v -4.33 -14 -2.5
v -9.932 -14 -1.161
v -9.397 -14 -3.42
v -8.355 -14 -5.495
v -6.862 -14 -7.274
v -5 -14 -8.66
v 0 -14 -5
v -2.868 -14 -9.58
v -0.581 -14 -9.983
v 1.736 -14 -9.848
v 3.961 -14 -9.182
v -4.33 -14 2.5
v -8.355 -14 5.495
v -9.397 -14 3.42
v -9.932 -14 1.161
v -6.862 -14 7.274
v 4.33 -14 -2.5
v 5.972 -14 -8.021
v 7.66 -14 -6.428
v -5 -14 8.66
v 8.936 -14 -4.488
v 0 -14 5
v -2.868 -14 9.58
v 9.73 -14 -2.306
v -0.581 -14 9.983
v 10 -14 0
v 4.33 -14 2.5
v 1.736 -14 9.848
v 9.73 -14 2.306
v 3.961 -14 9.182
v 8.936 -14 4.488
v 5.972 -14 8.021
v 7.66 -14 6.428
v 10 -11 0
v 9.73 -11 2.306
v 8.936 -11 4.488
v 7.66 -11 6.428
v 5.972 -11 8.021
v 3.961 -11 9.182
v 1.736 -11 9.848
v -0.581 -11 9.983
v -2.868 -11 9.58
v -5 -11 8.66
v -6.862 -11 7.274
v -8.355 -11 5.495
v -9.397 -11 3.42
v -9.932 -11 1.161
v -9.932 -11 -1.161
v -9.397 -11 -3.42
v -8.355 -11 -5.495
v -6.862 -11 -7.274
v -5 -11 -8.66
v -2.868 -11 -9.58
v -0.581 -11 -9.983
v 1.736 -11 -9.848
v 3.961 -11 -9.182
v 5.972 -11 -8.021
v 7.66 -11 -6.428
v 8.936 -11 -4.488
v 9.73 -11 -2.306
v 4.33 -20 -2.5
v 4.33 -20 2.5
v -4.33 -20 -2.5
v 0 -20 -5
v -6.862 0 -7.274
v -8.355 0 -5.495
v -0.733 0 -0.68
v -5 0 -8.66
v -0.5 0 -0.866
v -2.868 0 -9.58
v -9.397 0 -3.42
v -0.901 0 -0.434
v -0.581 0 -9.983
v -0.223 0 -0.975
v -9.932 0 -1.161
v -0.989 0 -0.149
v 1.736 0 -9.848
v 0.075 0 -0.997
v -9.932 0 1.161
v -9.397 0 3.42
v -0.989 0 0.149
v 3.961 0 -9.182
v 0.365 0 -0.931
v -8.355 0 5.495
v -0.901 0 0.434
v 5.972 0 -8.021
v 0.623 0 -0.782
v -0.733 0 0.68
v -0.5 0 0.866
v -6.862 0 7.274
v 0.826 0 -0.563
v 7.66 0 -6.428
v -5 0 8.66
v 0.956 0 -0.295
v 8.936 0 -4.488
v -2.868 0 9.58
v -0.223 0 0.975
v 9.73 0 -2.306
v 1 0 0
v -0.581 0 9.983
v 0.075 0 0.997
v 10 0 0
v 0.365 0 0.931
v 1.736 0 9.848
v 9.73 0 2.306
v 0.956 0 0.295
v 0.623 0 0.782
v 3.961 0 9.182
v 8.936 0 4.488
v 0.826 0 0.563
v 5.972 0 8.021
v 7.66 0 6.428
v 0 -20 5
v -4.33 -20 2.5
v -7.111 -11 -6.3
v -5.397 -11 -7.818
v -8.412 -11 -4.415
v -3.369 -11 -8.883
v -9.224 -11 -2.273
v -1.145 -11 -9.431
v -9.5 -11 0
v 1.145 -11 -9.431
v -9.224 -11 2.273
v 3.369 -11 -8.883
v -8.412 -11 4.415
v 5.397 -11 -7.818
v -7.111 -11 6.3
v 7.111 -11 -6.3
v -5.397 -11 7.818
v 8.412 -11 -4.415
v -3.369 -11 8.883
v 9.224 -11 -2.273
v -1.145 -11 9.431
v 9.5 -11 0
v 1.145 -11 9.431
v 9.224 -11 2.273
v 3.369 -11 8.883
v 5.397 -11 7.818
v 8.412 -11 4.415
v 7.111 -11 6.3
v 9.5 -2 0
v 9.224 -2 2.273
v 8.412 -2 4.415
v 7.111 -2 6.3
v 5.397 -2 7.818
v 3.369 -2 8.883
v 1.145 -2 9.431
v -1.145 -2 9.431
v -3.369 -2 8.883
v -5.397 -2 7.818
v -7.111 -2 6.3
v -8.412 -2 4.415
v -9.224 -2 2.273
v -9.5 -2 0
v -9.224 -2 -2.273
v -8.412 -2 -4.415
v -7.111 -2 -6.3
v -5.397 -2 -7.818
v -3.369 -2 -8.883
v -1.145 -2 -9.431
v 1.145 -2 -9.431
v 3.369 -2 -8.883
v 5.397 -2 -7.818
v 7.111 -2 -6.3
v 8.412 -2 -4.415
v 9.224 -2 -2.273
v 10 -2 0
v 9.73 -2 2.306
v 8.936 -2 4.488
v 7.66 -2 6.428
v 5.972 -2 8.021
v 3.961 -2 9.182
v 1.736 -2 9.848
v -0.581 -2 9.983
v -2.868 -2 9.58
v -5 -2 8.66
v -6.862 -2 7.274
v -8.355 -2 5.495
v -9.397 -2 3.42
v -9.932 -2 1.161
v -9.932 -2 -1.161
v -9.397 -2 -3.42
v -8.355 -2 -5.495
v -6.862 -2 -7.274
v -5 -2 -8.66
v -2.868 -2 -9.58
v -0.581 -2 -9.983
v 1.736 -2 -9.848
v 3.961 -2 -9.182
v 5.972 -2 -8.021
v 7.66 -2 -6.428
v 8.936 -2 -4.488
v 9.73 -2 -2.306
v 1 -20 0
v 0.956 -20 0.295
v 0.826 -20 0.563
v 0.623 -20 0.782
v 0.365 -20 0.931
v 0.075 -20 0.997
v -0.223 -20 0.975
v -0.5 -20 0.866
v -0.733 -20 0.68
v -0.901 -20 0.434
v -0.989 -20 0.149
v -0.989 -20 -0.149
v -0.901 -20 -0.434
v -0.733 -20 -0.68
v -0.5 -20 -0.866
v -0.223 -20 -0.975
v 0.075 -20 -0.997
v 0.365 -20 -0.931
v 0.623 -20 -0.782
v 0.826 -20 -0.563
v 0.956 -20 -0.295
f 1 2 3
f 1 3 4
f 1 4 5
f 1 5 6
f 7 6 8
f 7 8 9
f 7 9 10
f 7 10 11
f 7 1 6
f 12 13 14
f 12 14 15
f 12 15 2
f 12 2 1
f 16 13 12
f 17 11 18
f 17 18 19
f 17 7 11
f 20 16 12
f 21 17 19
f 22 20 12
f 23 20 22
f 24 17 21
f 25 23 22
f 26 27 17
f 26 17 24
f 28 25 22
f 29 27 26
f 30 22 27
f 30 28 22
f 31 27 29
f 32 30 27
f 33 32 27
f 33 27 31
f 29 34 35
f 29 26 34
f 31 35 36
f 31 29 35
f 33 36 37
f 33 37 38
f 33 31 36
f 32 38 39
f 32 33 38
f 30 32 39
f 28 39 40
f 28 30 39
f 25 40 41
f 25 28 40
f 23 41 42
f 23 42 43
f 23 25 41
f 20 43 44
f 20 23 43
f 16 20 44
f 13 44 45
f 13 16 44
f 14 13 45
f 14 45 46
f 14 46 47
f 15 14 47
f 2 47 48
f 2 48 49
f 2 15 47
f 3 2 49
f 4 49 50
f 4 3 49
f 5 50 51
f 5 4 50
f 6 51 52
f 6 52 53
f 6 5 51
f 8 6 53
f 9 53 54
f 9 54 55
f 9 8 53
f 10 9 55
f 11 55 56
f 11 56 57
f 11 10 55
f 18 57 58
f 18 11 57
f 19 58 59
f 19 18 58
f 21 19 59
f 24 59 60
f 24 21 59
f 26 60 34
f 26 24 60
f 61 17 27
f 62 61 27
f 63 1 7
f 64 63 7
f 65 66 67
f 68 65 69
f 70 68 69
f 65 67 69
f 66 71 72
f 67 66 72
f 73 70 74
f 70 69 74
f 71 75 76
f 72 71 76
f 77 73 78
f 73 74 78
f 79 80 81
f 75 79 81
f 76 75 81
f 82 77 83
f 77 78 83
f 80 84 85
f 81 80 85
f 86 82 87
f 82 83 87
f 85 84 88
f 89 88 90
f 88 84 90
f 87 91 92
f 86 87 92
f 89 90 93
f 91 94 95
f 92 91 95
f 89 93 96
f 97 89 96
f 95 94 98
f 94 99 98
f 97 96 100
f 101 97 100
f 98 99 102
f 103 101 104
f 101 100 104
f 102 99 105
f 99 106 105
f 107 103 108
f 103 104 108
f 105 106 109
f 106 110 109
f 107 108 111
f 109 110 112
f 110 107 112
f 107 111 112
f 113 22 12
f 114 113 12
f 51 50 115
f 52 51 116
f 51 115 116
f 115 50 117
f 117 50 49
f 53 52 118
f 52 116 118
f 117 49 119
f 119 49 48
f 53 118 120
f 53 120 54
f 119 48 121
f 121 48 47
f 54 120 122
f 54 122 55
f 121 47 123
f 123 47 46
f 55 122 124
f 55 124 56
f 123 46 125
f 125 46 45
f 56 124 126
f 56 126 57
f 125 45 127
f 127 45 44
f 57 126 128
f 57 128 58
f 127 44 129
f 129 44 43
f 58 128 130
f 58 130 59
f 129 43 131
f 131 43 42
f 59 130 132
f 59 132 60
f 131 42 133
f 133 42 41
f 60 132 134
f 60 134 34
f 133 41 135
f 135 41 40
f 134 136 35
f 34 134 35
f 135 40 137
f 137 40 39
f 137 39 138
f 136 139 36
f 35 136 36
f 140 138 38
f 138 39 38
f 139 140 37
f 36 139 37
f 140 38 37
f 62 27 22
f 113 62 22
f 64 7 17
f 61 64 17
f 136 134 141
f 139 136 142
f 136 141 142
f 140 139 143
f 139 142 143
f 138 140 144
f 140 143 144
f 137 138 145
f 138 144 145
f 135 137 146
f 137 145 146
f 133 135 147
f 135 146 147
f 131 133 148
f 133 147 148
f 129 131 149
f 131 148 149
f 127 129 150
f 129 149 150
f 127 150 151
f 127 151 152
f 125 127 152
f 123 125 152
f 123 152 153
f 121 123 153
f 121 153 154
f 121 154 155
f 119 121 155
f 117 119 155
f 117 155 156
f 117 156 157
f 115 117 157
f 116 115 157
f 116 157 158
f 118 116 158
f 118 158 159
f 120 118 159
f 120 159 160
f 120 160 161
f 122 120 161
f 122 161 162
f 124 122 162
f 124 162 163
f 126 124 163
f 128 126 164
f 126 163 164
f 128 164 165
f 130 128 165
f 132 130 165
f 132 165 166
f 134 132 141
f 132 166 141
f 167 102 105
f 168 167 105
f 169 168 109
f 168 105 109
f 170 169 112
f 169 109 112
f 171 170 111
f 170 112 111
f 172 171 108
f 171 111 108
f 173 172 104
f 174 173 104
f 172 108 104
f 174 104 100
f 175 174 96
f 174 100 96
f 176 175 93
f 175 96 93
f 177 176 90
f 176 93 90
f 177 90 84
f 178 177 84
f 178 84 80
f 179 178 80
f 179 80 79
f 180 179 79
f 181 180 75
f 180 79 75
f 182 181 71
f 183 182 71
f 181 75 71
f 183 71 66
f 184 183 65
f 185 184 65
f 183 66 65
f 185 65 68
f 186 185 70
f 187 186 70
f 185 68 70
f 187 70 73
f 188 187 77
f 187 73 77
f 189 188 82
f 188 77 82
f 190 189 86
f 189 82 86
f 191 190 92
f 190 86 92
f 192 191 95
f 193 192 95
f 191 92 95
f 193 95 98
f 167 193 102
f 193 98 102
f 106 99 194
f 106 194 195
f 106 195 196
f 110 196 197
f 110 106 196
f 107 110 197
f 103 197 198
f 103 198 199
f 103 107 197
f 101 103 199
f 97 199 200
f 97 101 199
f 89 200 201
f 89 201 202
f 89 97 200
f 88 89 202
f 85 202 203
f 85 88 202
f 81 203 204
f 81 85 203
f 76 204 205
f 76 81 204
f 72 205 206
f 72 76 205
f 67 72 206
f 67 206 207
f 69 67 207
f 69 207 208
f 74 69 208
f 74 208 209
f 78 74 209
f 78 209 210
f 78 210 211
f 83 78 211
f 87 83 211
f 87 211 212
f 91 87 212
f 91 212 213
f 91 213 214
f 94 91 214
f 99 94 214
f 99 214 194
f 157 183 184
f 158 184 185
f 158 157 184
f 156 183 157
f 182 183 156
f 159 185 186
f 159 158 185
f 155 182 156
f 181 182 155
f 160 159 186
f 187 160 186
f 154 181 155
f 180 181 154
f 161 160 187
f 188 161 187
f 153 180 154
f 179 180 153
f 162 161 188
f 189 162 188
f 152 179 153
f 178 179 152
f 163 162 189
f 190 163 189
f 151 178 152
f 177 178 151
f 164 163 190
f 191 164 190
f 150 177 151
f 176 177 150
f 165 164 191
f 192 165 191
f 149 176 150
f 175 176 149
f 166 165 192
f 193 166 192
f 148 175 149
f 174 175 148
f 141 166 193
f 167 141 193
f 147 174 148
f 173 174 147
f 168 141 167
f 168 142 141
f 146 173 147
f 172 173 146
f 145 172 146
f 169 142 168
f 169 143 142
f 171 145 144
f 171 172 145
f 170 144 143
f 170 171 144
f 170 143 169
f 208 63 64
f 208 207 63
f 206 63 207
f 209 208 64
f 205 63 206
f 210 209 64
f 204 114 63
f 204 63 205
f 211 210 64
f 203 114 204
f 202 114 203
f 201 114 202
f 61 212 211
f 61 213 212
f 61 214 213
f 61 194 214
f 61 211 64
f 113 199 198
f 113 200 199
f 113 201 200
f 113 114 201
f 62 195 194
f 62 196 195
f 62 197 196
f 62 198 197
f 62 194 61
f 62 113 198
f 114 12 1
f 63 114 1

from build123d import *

# Parameters (mm, degrees)
F0_R     = 10
F0_R_2   = 9.5
F0_R_3   = 1
F1_DEPTH = 2
F2_DEPTH = 12
F3_R     = 10
F3_R_2   = 9.5
F3_R_3   = 1
F4_DEPTH = 2
F5_DEPTH = 8
F6_DEPTH = 20
F7_DEPTH = 1


with BuildPart() as f1:
    # F0 (on Front) → F1 (new body)
    with BuildSketch(Plane.XZ):
        Circle(F0_R)
        Circle(F0_R_2, mode=Mode.SUBTRACT)
        Circle(F0_R_2)
        with BuildLine():
            ThreePointArc((4.3301270189, 2.5), (4.8296291314, 1.2940952255), (5, 0))
            ThreePointArc((5, 0), (4.8296291314, -1.2940952255), (4.3301270189, -2.5))
            ThreePointArc((4.3301270189, -2.5), (2.5, -4.3301270189), (0, -5))
            ThreePointArc((0, -5), (-2.5, -4.3301270189), (-4.3301270189, -2.5))
            ThreePointArc((-4.3301270189, -2.5), (-5, 0), (-4.3301270189, 2.5))
            ThreePointArc((-4.3301270189, 2.5), (-2.5, 4.3301270189), (0, 5))
            ThreePointArc((0, 5), (2.5, 4.3301270189), (4.3301270189, 2.5))
        make_face(mode=Mode.SUBTRACT)
        with BuildLine():
            Line((0, 5), (4.3301270189, 2.5))
            ThreePointArc((4.3301270189, 2.5), (2.5, 4.3301270189), (0, 5))
        make_face()
        with BuildLine():
            Line((-4.3301270189, 2.5), (0, 5))
            ThreePointArc((0, 5), (-2.5, 4.3301270189), (-4.3301270189, 2.5))
        make_face()
        with BuildLine():
            Line((-4.3301270189, -2.5), (-4.3301270189, 2.5))
            ThreePointArc((-4.3301270189, 2.5), (-5, 0), (-4.3301270189, -2.5))
        make_face()
        with BuildLine():
            ThreePointArc((-4.3301270189, -2.5), (-2.5, -4.3301270189), (0, -5))
            Line((0, -5), (-4.3301270189, -2.5))
        make_face()
        with BuildLine():
            ThreePointArc((0, -5), (2.5, -4.3301270189), (4.3301270189, -2.5))
            Line((4.3301270189, -2.5), (0, -5))
        make_face()
        Polygon((4.3301270189, -2.5), (4.3301270189, 2.5), (0, 5), (-4.3301270189, 2.5), (-4.3301270189, -2.5), (0, -5), align=None)
        Circle(F0_R_3, mode=Mode.SUBTRACT)
        with BuildLine():
            ThreePointArc((4.3301270189, -2.5), (4.8296291314, -1.2940952255), (5, 0))
            ThreePointArc((5, 0), (4.8296291314, 1.2940952255), (4.3301270189, 2.5))
            Line((4.3301270189, 2.5), (4.3301270189, -2.5))
        make_face()
    extrude(amount=F1_DEPTH)

    # F0 (on Front) → F2 (join)
    with BuildSketch(Plane.XZ):
        Circle(F0_R_2)
        with BuildLine():
            ThreePointArc((4.3301270189, 2.5), (4.8296291314, 1.2940952255), (5, 0))
            ThreePointArc((5, 0), (4.8296291314, -1.2940952255), (4.3301270189, -2.5))
            ThreePointArc((4.3301270189, -2.5), (2.5, -4.3301270189), (0, -5))
            ThreePointArc((0, -5), (-2.5, -4.3301270189), (-4.3301270189, -2.5))
            ThreePointArc((-4.3301270189, -2.5), (-5, 0), (-4.3301270189, 2.5))
            ThreePointArc((-4.3301270189, 2.5), (-2.5, 4.3301270189), (0, 5))
            ThreePointArc((0, 5), (2.5, 4.3301270189), (4.3301270189, 2.5))
        make_face(mode=Mode.SUBTRACT)
        Polygon((4.3301270189, -2.5), (4.3301270189, 2.5), (0, 5), (-4.3301270189, 2.5), (-4.3301270189, -2.5), (0, -5), align=None)
        Circle(F0_R_3, mode=Mode.SUBTRACT)
        with BuildLine():
            Line((-4.3301270189, 2.5), (0, 5))
            ThreePointArc((0, 5), (-2.5, 4.3301270189), (-4.3301270189, 2.5))
        make_face()
        with BuildLine():
            Line((0, 5), (4.3301270189, 2.5))
            ThreePointArc((4.3301270189, 2.5), (2.5, 4.3301270189), (0, 5))
        make_face()
        with BuildLine():
            ThreePointArc((4.3301270189, -2.5), (4.8296291314, -1.2940952255), (5, 0))
            ThreePointArc((5, 0), (4.8296291314, 1.2940952255), (4.3301270189, 2.5))
            Line((4.3301270189, 2.5), (4.3301270189, -2.5))
        make_face()
        with BuildLine():
            Line((-4.3301270189, -2.5), (-4.3301270189, 2.5))
            ThreePointArc((-4.3301270189, 2.5), (-5, 0), (-4.3301270189, -2.5))
        make_face()
        with BuildLine():
            ThreePointArc((-4.3301270189, -2.5), (-2.5, -4.3301270189), (0, -5))
            Line((0, -5), (-4.3301270189, -2.5))
        make_face()
        with BuildLine():
            ThreePointArc((0, -5), (2.5, -4.3301270189), (4.3301270189, -2.5))
            Line((4.3301270189, -2.5), (0, -5))
        make_face()
    extrude(amount=F2_DEPTH)



with BuildPart() as f4:
    # F3 (on face) → F4 (new body)
    with BuildSketch(Plane.XZ.offset(12)):
        Circle(F3_R)
        Circle(F3_R_2, mode=Mode.SUBTRACT)
        Circle(F3_R_2)
        with BuildLine():
            ThreePointArc((4.3301270189, 2.5), (4.8296291314, 1.2940952255), (5, 0))
            ThreePointArc((5, 0), (4.8296291314, -1.2940952255), (4.3301270189, -2.5))
            ThreePointArc((4.3301270189, -2.5), (2.5, -4.3301270189), (0, -5))
            ThreePointArc((0, -5), (-2.5, -4.3301270189), (-4.3301270189, -2.5))
            ThreePointArc((-4.3301270189, -2.5), (-5, 0), (-4.3301270189, 2.5))
            ThreePointArc((-4.3301270189, 2.5), (-2.5, 4.3301270189), (0, 5))
            ThreePointArc((0, 5), (2.5, 4.3301270189), (4.3301270189, 2.5))
        make_face(mode=Mode.SUBTRACT)
        with BuildLine():
            Line((-4.3301270189, 2.5), (0, 5))
            ThreePointArc((0, 5), (-2.5, 4.3301270189), (-4.3301270189, 2.5))
        make_face()
        with BuildLine():
            Line((-4.3301270189, -2.5), (-4.3301270189, 2.5))
            ThreePointArc((-4.3301270189, 2.5), (-5, 0), (-4.3301270189, -2.5))
        make_face()
        with BuildLine():
            Line((0, 5), (4.3301270189, 2.5))
            ThreePointArc((4.3301270189, 2.5), (2.5, 4.3301270189), (0, 5))
        make_face()
        Polygon((4.3301270189, -2.5), (4.3301270189, 2.5), (0, 5), (-4.3301270189, 2.5), (-4.3301270189, -2.5), (0, -5), align=None)
        Circle(F3_R_3, mode=Mode.SUBTRACT)
        with BuildLine():
            ThreePointArc((4.3301270189, -2.5), (4.8296291314, -1.2940952255), (5, 0))
            ThreePointArc((5, 0), (4.8296291314, 1.2940952255), (4.3301270189, 2.5))
            Line((4.3301270189, 2.5), (4.3301270189, -2.5))
        make_face()
        with BuildLine():
            ThreePointArc((0, -5), (2.5, -4.3301270189), (4.3301270189, -2.5))
            Line((4.3301270189, -2.5), (0, -5))
        make_face()
        with BuildLine():
            ThreePointArc((-4.3301270189, -2.5), (-2.5, -4.3301270189), (0, -5))
            Line((0, -5), (-4.3301270189, -2.5))
        make_face()
    extrude(amount=F4_DEPTH)


with BuildPart() as f1_1:
    add(f1.part)

    add(f4.part)  # F5 merges F4
    # F3 (on face) → F5 (join)
    with BuildSketch(Plane.XZ.offset(12)):
        Polygon((4.3301270189, -2.5), (4.3301270189, 2.5), (0, 5), (-4.3301270189, 2.5), (-4.3301270189, -2.5), (0, -5), align=None)
        Circle(F3_R_3, mode=Mode.SUBTRACT)
    extrude(amount=F5_DEPTH)

    # F3 (on face) → F6 (cut)
    with BuildSketch(Plane.XZ.offset(12)):
        Circle(F3_R_3)
    extrude(amount=F6_DEPTH, mode=Mode.SUBTRACT)

    # F3 (on face) → F7 (join)
    with BuildSketch(Plane.XZ.offset(12)):
        Circle(F3_R)
        Circle(F3_R_2, mode=Mode.SUBTRACT)
    extrude(amount=-F7_DEPTH)


solid = f1_1.part
